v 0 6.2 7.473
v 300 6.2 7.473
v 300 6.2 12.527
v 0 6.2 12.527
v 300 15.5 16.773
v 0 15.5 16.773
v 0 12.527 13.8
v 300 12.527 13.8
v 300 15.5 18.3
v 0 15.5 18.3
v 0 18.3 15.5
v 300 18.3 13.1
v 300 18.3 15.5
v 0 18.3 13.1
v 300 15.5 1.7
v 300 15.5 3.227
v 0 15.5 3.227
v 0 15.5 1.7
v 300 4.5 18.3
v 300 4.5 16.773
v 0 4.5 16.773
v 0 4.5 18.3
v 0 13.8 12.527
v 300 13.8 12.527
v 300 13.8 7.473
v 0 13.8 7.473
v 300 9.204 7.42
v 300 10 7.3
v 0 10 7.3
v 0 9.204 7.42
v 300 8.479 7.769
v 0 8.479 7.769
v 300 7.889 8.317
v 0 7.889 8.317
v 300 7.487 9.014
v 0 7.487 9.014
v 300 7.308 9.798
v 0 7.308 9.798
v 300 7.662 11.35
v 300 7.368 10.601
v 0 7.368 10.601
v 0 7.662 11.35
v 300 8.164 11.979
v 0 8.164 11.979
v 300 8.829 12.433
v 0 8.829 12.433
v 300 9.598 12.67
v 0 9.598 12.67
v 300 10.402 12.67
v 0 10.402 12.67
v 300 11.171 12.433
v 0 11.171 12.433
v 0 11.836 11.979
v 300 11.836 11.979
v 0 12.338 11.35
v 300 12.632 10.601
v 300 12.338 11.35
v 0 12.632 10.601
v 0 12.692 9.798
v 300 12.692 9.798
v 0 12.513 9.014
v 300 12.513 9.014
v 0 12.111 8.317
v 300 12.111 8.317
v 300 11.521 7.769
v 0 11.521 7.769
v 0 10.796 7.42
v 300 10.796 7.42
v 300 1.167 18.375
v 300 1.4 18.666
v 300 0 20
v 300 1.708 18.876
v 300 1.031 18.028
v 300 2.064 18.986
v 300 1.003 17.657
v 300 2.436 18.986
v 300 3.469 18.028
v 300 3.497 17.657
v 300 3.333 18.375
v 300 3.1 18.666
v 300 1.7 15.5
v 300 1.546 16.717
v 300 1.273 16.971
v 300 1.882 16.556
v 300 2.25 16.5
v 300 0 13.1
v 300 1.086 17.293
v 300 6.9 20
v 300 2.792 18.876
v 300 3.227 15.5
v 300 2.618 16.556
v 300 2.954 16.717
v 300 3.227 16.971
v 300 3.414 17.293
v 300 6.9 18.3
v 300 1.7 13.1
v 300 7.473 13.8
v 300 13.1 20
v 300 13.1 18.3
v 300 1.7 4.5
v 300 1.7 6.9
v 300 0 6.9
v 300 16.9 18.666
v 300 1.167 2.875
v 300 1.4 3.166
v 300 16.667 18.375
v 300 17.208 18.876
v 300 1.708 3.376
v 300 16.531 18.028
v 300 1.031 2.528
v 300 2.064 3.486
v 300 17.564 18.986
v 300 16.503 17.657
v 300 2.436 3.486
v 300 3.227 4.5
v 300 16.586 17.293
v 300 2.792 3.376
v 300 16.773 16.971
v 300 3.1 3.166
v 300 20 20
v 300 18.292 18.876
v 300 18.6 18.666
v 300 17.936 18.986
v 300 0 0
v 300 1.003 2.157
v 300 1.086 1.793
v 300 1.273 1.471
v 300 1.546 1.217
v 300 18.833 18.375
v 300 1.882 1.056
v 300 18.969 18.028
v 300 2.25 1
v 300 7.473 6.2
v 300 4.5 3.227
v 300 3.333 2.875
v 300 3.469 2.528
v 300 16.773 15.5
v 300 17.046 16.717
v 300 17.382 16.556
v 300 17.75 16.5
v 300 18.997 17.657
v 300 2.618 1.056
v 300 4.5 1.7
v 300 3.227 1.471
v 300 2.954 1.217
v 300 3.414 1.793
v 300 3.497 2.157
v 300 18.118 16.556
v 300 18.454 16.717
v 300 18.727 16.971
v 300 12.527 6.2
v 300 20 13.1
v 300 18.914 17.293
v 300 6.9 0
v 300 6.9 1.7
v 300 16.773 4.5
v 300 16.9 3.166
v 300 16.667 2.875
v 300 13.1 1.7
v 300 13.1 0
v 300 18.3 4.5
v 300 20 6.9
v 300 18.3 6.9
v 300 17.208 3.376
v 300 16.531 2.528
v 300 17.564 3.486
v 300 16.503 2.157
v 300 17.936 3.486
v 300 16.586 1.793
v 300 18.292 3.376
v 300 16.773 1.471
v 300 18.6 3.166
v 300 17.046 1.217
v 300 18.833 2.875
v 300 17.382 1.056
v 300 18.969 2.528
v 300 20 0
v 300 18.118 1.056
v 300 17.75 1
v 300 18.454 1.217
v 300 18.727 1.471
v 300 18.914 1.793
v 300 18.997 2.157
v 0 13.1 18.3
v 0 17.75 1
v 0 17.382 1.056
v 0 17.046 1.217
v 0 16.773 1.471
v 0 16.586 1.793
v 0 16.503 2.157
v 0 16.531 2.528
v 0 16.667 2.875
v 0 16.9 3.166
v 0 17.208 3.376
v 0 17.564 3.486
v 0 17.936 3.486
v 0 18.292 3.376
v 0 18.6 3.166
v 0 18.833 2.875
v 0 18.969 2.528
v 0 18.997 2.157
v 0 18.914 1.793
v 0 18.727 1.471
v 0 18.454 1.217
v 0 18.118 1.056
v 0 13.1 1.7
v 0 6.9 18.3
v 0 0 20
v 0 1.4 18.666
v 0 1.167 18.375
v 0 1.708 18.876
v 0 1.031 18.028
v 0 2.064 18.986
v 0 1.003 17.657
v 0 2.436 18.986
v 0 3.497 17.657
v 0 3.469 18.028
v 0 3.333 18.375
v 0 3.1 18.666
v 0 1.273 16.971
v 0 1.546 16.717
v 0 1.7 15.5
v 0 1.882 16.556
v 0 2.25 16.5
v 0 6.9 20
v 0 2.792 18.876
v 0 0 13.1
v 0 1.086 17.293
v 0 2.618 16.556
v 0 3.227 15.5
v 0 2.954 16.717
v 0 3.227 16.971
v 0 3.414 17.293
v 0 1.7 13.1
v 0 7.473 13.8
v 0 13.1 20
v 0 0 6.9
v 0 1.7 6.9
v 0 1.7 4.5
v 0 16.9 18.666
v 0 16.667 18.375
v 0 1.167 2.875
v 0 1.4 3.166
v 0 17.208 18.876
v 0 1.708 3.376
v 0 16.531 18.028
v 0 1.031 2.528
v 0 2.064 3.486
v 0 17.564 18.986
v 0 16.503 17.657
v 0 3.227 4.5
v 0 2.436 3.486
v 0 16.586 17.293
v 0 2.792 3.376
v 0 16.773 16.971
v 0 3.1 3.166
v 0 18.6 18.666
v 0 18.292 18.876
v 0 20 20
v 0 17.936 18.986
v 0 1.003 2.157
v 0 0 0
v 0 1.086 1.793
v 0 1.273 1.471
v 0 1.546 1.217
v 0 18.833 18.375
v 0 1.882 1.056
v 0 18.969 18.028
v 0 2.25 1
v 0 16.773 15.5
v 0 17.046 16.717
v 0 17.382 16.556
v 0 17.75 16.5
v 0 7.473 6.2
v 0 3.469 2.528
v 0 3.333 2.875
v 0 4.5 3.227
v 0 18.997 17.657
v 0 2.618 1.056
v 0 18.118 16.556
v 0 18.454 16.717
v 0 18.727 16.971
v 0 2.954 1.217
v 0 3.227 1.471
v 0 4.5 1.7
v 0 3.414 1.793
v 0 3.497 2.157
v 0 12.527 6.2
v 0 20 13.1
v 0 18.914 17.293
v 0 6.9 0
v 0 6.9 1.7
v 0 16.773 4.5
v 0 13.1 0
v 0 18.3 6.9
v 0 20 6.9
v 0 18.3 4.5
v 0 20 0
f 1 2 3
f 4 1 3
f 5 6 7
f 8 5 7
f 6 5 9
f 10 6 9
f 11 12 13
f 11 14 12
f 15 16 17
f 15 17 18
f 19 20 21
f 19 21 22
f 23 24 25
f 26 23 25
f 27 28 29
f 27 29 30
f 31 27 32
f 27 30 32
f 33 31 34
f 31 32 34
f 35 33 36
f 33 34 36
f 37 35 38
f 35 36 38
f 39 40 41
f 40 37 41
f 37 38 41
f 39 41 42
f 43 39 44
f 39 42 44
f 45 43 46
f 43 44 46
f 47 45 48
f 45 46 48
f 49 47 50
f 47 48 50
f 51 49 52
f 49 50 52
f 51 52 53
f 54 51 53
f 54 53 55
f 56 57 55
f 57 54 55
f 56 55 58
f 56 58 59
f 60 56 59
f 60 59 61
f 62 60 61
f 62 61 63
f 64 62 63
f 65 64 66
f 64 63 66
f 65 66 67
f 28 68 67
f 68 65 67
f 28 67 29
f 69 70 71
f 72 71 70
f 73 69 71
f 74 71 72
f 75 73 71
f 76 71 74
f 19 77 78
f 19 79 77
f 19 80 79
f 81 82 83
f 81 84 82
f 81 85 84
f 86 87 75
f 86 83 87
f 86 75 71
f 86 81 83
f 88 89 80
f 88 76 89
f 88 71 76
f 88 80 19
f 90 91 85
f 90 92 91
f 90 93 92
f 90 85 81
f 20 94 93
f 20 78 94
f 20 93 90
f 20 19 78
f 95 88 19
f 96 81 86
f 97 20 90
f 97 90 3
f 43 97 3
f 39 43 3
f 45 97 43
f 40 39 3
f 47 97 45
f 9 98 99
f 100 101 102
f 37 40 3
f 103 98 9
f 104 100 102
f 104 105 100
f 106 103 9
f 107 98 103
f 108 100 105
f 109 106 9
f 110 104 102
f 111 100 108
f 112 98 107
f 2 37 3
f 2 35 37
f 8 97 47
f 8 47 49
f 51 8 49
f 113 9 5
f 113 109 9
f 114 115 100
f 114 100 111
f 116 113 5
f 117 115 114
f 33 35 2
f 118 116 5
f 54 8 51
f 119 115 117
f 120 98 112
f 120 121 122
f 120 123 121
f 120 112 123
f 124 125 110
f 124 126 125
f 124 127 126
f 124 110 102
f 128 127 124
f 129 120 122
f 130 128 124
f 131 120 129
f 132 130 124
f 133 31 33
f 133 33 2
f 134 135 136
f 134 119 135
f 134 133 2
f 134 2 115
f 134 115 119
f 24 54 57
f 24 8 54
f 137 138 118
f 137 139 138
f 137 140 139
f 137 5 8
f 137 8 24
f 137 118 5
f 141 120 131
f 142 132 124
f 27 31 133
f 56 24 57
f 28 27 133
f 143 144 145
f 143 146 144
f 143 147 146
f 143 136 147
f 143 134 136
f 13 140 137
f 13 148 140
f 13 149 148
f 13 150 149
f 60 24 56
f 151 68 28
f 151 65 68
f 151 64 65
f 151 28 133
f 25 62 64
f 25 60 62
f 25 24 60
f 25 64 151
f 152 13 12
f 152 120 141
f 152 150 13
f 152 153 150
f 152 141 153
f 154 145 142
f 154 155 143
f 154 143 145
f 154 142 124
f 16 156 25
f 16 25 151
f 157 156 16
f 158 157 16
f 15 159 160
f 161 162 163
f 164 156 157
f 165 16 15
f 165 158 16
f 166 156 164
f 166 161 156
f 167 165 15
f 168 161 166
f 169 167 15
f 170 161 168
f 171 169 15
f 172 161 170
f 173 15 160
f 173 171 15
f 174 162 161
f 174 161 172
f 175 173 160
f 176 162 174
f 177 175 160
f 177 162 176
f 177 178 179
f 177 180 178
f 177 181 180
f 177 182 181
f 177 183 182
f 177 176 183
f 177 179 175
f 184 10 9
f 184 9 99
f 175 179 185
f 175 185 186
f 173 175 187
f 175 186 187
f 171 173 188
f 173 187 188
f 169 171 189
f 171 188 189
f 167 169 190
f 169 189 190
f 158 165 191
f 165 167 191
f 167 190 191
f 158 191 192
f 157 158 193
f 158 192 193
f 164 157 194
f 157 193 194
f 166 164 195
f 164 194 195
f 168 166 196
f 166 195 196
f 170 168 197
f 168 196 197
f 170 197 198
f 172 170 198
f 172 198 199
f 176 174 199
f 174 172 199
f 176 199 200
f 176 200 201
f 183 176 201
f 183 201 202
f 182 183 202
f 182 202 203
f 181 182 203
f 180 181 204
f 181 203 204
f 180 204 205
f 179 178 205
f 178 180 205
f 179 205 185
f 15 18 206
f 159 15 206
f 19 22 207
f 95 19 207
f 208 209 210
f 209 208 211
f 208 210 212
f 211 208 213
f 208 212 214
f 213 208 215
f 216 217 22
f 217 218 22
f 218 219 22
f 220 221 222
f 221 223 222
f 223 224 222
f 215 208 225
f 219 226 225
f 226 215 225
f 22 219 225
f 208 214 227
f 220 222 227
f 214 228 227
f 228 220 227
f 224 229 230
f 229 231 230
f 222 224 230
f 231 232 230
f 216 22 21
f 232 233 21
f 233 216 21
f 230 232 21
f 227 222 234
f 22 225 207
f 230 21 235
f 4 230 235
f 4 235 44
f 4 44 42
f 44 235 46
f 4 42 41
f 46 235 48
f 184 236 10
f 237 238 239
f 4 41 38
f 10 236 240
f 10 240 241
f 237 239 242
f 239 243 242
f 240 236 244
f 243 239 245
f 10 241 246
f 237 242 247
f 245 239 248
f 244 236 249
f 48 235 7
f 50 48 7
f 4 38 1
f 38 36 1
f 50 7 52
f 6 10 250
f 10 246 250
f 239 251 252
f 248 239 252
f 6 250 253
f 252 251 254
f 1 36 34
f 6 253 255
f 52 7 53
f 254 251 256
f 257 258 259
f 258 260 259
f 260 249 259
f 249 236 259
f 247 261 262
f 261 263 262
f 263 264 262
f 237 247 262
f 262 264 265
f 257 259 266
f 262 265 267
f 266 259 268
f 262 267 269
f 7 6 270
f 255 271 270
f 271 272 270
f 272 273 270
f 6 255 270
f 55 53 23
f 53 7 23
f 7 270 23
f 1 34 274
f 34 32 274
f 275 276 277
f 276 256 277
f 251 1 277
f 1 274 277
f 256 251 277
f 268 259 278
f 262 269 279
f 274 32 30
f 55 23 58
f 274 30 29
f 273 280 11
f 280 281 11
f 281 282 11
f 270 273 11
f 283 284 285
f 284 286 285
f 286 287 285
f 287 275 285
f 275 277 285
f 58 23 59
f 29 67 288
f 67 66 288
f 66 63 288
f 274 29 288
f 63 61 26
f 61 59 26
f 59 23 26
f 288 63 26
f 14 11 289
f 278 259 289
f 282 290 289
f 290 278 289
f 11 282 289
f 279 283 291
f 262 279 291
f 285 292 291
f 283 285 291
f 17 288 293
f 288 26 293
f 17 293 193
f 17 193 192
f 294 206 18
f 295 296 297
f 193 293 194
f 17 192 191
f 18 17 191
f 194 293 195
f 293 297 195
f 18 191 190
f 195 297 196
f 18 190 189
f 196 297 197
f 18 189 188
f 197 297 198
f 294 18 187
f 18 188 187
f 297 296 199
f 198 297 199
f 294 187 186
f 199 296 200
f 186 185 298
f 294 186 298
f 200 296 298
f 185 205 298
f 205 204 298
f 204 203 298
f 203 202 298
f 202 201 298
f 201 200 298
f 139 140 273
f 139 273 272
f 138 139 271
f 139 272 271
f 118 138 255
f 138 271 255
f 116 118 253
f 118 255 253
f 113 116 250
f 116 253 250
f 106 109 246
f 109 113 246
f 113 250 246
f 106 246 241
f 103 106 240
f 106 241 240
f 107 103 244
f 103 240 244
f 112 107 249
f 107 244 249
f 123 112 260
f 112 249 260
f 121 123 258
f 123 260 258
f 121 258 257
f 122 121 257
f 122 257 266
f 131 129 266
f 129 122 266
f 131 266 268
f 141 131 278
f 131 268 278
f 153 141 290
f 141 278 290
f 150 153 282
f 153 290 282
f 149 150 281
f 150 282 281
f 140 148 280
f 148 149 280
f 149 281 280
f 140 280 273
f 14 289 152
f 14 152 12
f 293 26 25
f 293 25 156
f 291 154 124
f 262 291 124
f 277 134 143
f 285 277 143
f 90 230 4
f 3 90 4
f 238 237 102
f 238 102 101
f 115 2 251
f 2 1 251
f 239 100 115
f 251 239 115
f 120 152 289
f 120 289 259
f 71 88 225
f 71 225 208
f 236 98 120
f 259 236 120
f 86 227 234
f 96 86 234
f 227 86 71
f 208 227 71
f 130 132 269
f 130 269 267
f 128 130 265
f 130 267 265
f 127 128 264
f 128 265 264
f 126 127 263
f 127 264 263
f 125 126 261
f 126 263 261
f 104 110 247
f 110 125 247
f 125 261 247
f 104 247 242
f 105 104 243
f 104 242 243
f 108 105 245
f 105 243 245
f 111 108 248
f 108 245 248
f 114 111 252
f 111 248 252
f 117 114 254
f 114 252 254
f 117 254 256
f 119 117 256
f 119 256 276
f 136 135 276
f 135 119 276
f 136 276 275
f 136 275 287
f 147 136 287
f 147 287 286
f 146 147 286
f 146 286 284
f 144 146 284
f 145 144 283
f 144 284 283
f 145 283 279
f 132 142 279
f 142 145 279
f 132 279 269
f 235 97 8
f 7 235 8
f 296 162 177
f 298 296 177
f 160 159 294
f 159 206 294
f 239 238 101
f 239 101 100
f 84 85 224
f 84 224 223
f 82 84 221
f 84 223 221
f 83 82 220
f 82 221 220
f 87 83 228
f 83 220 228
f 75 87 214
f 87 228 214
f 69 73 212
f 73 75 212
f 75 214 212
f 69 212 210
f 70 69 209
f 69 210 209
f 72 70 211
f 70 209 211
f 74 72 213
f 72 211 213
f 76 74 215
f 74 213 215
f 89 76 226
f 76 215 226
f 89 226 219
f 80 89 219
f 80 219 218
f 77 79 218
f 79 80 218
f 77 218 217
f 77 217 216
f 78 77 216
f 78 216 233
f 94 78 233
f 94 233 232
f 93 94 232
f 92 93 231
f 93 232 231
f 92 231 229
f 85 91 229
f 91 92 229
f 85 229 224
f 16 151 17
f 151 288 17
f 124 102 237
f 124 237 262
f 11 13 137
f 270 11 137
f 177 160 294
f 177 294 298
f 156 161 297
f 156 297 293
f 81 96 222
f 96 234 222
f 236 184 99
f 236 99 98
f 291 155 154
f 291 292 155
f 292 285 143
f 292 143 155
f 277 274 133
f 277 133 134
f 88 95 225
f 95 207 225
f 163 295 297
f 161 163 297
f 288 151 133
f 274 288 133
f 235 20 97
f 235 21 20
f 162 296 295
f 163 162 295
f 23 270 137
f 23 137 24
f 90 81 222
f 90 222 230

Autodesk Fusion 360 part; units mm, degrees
sketch "Sketch1" plane through (0, 0, 0) normal (1, 0, 0) x (0, 0, -1)
  circle A0 centre (-17.75, 2.25) radius 1.25
  circle A1 centre (-2.25, 2.25) radius 1.25
  circle A2 centre (-17.75, 17.75) radius 1.25
  circle A3 centre (-2.25, 17.75) radius 1.25
  circle A4 centre (-10, 10) radius 2.7
  line L0 (-13.1, 0) -> (-13.1, 1.7)
  line L1 (-13.1, 1.7) -> (-15.5, 1.7)
  line L2 (-15.5, 1.7) -> (-15.5, 3.2272)
  line L3 (-13.1, 0) -> (-20, 0)
  line L4 (-13.1, 0) -> (-6.9, 0) construction
  line L5 (-10, 15.8164) -> (-10, 4.0346) construction
  line L6 (-15.4081, 10) -> (-4.6511, 10) construction
  line L7 (-16.7728, 4.5) -> (-18.3, 4.5)
  line L8 (-18.3, 4.5) -> (-18.3, 6.9)
  line L9 (-18.3, 6.9) -> (-20, 6.9)
  line L10 (-20, 6.9) -> (-20, 0)
  line L11 (0, 6.9) -> (0, 0)
  line L12 (-1.7, 6.9) -> (0, 6.9)
  line L13 (-1.7, 4.5) -> (-1.7, 6.9)
  line L14 (-3.2272, 4.5) -> (-1.7, 4.5)
  line L15 (-4.5, 1.7) -> (-4.5, 3.2272)
  line L16 (-6.9, 1.7) -> (-4.5, 1.7)
  line L17 (-6.9, 0) -> (-6.9, 1.7)
  line L18 (-6.9, 0) -> (0, 0)
  line L19 (-6.9, 20) -> (-6.9, 18.3)
  line L20 (-6.9, 18.3) -> (-4.5, 18.3)
  line L21 (-4.5, 18.3) -> (-4.5, 16.7728)
  line L22 (-3.2272, 15.5) -> (-1.7, 15.5)
  line L23 (-1.7, 15.5) -> (-1.7, 13.1)
  line L24 (-1.7, 13.1) -> (0, 13.1)
  line L25 (0, 13.1) -> (0, 20)
  line L26 (-6.9, 20) -> (0, 20)
  line L27 (-13.1, 20) -> (-13.1, 18.3)
  line L28 (-13.1, 20) -> (-20, 20)
  line L29 (-13.1, 18.3) -> (-15.5, 18.3)
  line L30 (-15.5, 18.3) -> (-15.5, 16.7728)
  line L31 (-16.7728, 15.5) -> (-18.3, 15.5)
  line L32 (-18.3, 15.5) -> (-18.3, 13.1)
  line L33 (-18.3, 13.1) -> (-20, 13.1)
  line L34 (-20, 13.1) -> (-20, 20)
  line L35 (-16.7728, 4.5) -> (-13.8, 7.4728)
  line L36 (-7.4728, 13.8) -> (-4.5, 16.7728)
  line L37 (-15.5, 16.7728) -> (-12.5272, 13.8)
  line L38 (-6.2, 7.4728) -> (-3.2272, 4.5)
  line L39 (-15.5, 3.2272) -> (-12.5272, 6.2)
  line L40 (-6.2, 12.5272) -> (-3.2272, 15.5)
  line L41 (-16.7728, 15.5) -> (-13.8, 12.5272)
  line L42 (-7.4728, 6.2) -> (-4.5, 3.2272)
  line L43 (-12.5272, 13.8) -> (-7.4728, 13.8)
  line L44 (-6.2, 12.5272) -> (-6.2, 7.4728)
  line L45 (-7.4728, 6.2) -> (-12.5272, 6.2)
  line L46 (-13.8, 7.4728) -> (-13.8, 12.5272)
  line L47 (-17.75, 17.75) -> (-2.25, 2.25) construction
  line L48 (-17.75, 2.25) -> (-2.25, 17.75) construction
  dimension "d3" = 2.5
  dimension "d13" = 15.5
  dimension "d14" = 5.4
  dimension "d16" = 2.4
  dimension "d19" = 1.7
  dimension "d21" = 3.1
  dimension "d29" = 4.5
  dimension "d30" = 1.7
  dimension "d31" = 2.4
  dimension "d32" = 4.5
extrude "Extrude1" add sketch "Sketch1" along normal blind 300
